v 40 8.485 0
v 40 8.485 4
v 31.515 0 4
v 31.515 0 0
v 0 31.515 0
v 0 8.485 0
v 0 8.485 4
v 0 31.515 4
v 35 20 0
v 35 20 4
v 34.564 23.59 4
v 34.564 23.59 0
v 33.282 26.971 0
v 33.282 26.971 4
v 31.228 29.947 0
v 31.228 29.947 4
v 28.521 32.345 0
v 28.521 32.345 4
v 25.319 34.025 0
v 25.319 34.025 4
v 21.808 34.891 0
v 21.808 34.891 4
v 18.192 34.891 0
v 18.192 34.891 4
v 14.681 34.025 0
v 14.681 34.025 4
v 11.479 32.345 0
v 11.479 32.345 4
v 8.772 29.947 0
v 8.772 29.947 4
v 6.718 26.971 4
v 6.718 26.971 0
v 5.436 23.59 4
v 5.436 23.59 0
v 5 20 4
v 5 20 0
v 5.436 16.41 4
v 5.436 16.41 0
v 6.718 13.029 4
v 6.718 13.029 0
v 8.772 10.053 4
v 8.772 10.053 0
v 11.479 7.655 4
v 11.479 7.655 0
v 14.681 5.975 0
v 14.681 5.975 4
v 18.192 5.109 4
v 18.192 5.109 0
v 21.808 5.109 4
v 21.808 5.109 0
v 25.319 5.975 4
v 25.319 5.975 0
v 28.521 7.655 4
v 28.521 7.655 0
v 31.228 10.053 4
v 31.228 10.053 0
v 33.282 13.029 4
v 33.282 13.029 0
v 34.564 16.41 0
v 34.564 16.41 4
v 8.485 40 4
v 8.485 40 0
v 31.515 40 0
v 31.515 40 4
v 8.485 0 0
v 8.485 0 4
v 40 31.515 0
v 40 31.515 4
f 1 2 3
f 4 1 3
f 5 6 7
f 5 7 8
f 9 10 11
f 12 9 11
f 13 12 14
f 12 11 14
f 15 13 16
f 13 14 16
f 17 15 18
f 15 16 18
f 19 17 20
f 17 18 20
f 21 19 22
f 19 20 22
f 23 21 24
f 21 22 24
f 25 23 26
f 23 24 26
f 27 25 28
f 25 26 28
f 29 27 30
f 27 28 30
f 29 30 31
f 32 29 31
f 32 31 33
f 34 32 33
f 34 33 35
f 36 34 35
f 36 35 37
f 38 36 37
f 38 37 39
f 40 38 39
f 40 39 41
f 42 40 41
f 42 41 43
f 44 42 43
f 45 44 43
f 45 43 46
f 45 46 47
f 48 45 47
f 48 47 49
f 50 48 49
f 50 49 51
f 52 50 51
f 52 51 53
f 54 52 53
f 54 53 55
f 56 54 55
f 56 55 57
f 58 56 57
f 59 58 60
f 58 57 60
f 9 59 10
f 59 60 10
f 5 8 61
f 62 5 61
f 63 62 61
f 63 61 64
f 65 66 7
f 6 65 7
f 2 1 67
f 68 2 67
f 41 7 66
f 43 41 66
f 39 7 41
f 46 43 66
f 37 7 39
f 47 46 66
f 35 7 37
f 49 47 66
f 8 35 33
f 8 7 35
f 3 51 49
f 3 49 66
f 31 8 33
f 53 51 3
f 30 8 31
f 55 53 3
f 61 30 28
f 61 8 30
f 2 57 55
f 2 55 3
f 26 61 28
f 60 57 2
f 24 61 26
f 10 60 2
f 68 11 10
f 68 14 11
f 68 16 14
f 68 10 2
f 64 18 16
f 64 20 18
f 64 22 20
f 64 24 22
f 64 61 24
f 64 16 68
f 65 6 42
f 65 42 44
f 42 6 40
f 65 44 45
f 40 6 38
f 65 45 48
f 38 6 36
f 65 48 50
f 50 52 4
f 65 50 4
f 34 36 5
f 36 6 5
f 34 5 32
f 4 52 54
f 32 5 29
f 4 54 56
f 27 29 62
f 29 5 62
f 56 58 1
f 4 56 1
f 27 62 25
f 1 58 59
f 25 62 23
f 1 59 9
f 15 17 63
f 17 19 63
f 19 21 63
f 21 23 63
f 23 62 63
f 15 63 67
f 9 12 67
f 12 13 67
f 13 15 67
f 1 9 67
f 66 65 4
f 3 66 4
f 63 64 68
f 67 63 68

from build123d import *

# Parameters (mm, degrees)
F0_W     = 40
F0_H     = 40
F1_DEPTH = 4
F3_DEPTH = 25
F4_R     = 15
F5_DEPTH = 25


with BuildPart() as f1:
    # F0 (on Top) → F1 (new body)
    with BuildSketch(Plane.XY):
        with Locations((20, 20)):
            Rectangle(F0_W, F0_H)
    extrude(amount=F1_DEPTH)

    # F2 (on face) → F3 (cut)
    with BuildSketch(Plane.XY.offset(4)):
        Polygon((0, 40), (0, 31.514719), (8.485281, 40), align=None)
        Polygon((40, 40), (31.514719, 40), (40, 31.514719), align=None)
        Polygon((40, 8.485281), (31.514719, 0), (40, 0), align=None)
        Polygon((8.485281, 0), (0, 8.485281), (0, 0), align=None)
    extrude(amount=-F3_DEPTH, mode=Mode.SUBTRACT)

    # F4 (on face) → F5 (cut)
    with BuildSketch(Plane.XY.offset(4)):
        with Locations((20, 20)):
            Circle(F4_R)
    extrude(amount=-F5_DEPTH, mode=Mode.SUBTRACT)


solid = f1.part
